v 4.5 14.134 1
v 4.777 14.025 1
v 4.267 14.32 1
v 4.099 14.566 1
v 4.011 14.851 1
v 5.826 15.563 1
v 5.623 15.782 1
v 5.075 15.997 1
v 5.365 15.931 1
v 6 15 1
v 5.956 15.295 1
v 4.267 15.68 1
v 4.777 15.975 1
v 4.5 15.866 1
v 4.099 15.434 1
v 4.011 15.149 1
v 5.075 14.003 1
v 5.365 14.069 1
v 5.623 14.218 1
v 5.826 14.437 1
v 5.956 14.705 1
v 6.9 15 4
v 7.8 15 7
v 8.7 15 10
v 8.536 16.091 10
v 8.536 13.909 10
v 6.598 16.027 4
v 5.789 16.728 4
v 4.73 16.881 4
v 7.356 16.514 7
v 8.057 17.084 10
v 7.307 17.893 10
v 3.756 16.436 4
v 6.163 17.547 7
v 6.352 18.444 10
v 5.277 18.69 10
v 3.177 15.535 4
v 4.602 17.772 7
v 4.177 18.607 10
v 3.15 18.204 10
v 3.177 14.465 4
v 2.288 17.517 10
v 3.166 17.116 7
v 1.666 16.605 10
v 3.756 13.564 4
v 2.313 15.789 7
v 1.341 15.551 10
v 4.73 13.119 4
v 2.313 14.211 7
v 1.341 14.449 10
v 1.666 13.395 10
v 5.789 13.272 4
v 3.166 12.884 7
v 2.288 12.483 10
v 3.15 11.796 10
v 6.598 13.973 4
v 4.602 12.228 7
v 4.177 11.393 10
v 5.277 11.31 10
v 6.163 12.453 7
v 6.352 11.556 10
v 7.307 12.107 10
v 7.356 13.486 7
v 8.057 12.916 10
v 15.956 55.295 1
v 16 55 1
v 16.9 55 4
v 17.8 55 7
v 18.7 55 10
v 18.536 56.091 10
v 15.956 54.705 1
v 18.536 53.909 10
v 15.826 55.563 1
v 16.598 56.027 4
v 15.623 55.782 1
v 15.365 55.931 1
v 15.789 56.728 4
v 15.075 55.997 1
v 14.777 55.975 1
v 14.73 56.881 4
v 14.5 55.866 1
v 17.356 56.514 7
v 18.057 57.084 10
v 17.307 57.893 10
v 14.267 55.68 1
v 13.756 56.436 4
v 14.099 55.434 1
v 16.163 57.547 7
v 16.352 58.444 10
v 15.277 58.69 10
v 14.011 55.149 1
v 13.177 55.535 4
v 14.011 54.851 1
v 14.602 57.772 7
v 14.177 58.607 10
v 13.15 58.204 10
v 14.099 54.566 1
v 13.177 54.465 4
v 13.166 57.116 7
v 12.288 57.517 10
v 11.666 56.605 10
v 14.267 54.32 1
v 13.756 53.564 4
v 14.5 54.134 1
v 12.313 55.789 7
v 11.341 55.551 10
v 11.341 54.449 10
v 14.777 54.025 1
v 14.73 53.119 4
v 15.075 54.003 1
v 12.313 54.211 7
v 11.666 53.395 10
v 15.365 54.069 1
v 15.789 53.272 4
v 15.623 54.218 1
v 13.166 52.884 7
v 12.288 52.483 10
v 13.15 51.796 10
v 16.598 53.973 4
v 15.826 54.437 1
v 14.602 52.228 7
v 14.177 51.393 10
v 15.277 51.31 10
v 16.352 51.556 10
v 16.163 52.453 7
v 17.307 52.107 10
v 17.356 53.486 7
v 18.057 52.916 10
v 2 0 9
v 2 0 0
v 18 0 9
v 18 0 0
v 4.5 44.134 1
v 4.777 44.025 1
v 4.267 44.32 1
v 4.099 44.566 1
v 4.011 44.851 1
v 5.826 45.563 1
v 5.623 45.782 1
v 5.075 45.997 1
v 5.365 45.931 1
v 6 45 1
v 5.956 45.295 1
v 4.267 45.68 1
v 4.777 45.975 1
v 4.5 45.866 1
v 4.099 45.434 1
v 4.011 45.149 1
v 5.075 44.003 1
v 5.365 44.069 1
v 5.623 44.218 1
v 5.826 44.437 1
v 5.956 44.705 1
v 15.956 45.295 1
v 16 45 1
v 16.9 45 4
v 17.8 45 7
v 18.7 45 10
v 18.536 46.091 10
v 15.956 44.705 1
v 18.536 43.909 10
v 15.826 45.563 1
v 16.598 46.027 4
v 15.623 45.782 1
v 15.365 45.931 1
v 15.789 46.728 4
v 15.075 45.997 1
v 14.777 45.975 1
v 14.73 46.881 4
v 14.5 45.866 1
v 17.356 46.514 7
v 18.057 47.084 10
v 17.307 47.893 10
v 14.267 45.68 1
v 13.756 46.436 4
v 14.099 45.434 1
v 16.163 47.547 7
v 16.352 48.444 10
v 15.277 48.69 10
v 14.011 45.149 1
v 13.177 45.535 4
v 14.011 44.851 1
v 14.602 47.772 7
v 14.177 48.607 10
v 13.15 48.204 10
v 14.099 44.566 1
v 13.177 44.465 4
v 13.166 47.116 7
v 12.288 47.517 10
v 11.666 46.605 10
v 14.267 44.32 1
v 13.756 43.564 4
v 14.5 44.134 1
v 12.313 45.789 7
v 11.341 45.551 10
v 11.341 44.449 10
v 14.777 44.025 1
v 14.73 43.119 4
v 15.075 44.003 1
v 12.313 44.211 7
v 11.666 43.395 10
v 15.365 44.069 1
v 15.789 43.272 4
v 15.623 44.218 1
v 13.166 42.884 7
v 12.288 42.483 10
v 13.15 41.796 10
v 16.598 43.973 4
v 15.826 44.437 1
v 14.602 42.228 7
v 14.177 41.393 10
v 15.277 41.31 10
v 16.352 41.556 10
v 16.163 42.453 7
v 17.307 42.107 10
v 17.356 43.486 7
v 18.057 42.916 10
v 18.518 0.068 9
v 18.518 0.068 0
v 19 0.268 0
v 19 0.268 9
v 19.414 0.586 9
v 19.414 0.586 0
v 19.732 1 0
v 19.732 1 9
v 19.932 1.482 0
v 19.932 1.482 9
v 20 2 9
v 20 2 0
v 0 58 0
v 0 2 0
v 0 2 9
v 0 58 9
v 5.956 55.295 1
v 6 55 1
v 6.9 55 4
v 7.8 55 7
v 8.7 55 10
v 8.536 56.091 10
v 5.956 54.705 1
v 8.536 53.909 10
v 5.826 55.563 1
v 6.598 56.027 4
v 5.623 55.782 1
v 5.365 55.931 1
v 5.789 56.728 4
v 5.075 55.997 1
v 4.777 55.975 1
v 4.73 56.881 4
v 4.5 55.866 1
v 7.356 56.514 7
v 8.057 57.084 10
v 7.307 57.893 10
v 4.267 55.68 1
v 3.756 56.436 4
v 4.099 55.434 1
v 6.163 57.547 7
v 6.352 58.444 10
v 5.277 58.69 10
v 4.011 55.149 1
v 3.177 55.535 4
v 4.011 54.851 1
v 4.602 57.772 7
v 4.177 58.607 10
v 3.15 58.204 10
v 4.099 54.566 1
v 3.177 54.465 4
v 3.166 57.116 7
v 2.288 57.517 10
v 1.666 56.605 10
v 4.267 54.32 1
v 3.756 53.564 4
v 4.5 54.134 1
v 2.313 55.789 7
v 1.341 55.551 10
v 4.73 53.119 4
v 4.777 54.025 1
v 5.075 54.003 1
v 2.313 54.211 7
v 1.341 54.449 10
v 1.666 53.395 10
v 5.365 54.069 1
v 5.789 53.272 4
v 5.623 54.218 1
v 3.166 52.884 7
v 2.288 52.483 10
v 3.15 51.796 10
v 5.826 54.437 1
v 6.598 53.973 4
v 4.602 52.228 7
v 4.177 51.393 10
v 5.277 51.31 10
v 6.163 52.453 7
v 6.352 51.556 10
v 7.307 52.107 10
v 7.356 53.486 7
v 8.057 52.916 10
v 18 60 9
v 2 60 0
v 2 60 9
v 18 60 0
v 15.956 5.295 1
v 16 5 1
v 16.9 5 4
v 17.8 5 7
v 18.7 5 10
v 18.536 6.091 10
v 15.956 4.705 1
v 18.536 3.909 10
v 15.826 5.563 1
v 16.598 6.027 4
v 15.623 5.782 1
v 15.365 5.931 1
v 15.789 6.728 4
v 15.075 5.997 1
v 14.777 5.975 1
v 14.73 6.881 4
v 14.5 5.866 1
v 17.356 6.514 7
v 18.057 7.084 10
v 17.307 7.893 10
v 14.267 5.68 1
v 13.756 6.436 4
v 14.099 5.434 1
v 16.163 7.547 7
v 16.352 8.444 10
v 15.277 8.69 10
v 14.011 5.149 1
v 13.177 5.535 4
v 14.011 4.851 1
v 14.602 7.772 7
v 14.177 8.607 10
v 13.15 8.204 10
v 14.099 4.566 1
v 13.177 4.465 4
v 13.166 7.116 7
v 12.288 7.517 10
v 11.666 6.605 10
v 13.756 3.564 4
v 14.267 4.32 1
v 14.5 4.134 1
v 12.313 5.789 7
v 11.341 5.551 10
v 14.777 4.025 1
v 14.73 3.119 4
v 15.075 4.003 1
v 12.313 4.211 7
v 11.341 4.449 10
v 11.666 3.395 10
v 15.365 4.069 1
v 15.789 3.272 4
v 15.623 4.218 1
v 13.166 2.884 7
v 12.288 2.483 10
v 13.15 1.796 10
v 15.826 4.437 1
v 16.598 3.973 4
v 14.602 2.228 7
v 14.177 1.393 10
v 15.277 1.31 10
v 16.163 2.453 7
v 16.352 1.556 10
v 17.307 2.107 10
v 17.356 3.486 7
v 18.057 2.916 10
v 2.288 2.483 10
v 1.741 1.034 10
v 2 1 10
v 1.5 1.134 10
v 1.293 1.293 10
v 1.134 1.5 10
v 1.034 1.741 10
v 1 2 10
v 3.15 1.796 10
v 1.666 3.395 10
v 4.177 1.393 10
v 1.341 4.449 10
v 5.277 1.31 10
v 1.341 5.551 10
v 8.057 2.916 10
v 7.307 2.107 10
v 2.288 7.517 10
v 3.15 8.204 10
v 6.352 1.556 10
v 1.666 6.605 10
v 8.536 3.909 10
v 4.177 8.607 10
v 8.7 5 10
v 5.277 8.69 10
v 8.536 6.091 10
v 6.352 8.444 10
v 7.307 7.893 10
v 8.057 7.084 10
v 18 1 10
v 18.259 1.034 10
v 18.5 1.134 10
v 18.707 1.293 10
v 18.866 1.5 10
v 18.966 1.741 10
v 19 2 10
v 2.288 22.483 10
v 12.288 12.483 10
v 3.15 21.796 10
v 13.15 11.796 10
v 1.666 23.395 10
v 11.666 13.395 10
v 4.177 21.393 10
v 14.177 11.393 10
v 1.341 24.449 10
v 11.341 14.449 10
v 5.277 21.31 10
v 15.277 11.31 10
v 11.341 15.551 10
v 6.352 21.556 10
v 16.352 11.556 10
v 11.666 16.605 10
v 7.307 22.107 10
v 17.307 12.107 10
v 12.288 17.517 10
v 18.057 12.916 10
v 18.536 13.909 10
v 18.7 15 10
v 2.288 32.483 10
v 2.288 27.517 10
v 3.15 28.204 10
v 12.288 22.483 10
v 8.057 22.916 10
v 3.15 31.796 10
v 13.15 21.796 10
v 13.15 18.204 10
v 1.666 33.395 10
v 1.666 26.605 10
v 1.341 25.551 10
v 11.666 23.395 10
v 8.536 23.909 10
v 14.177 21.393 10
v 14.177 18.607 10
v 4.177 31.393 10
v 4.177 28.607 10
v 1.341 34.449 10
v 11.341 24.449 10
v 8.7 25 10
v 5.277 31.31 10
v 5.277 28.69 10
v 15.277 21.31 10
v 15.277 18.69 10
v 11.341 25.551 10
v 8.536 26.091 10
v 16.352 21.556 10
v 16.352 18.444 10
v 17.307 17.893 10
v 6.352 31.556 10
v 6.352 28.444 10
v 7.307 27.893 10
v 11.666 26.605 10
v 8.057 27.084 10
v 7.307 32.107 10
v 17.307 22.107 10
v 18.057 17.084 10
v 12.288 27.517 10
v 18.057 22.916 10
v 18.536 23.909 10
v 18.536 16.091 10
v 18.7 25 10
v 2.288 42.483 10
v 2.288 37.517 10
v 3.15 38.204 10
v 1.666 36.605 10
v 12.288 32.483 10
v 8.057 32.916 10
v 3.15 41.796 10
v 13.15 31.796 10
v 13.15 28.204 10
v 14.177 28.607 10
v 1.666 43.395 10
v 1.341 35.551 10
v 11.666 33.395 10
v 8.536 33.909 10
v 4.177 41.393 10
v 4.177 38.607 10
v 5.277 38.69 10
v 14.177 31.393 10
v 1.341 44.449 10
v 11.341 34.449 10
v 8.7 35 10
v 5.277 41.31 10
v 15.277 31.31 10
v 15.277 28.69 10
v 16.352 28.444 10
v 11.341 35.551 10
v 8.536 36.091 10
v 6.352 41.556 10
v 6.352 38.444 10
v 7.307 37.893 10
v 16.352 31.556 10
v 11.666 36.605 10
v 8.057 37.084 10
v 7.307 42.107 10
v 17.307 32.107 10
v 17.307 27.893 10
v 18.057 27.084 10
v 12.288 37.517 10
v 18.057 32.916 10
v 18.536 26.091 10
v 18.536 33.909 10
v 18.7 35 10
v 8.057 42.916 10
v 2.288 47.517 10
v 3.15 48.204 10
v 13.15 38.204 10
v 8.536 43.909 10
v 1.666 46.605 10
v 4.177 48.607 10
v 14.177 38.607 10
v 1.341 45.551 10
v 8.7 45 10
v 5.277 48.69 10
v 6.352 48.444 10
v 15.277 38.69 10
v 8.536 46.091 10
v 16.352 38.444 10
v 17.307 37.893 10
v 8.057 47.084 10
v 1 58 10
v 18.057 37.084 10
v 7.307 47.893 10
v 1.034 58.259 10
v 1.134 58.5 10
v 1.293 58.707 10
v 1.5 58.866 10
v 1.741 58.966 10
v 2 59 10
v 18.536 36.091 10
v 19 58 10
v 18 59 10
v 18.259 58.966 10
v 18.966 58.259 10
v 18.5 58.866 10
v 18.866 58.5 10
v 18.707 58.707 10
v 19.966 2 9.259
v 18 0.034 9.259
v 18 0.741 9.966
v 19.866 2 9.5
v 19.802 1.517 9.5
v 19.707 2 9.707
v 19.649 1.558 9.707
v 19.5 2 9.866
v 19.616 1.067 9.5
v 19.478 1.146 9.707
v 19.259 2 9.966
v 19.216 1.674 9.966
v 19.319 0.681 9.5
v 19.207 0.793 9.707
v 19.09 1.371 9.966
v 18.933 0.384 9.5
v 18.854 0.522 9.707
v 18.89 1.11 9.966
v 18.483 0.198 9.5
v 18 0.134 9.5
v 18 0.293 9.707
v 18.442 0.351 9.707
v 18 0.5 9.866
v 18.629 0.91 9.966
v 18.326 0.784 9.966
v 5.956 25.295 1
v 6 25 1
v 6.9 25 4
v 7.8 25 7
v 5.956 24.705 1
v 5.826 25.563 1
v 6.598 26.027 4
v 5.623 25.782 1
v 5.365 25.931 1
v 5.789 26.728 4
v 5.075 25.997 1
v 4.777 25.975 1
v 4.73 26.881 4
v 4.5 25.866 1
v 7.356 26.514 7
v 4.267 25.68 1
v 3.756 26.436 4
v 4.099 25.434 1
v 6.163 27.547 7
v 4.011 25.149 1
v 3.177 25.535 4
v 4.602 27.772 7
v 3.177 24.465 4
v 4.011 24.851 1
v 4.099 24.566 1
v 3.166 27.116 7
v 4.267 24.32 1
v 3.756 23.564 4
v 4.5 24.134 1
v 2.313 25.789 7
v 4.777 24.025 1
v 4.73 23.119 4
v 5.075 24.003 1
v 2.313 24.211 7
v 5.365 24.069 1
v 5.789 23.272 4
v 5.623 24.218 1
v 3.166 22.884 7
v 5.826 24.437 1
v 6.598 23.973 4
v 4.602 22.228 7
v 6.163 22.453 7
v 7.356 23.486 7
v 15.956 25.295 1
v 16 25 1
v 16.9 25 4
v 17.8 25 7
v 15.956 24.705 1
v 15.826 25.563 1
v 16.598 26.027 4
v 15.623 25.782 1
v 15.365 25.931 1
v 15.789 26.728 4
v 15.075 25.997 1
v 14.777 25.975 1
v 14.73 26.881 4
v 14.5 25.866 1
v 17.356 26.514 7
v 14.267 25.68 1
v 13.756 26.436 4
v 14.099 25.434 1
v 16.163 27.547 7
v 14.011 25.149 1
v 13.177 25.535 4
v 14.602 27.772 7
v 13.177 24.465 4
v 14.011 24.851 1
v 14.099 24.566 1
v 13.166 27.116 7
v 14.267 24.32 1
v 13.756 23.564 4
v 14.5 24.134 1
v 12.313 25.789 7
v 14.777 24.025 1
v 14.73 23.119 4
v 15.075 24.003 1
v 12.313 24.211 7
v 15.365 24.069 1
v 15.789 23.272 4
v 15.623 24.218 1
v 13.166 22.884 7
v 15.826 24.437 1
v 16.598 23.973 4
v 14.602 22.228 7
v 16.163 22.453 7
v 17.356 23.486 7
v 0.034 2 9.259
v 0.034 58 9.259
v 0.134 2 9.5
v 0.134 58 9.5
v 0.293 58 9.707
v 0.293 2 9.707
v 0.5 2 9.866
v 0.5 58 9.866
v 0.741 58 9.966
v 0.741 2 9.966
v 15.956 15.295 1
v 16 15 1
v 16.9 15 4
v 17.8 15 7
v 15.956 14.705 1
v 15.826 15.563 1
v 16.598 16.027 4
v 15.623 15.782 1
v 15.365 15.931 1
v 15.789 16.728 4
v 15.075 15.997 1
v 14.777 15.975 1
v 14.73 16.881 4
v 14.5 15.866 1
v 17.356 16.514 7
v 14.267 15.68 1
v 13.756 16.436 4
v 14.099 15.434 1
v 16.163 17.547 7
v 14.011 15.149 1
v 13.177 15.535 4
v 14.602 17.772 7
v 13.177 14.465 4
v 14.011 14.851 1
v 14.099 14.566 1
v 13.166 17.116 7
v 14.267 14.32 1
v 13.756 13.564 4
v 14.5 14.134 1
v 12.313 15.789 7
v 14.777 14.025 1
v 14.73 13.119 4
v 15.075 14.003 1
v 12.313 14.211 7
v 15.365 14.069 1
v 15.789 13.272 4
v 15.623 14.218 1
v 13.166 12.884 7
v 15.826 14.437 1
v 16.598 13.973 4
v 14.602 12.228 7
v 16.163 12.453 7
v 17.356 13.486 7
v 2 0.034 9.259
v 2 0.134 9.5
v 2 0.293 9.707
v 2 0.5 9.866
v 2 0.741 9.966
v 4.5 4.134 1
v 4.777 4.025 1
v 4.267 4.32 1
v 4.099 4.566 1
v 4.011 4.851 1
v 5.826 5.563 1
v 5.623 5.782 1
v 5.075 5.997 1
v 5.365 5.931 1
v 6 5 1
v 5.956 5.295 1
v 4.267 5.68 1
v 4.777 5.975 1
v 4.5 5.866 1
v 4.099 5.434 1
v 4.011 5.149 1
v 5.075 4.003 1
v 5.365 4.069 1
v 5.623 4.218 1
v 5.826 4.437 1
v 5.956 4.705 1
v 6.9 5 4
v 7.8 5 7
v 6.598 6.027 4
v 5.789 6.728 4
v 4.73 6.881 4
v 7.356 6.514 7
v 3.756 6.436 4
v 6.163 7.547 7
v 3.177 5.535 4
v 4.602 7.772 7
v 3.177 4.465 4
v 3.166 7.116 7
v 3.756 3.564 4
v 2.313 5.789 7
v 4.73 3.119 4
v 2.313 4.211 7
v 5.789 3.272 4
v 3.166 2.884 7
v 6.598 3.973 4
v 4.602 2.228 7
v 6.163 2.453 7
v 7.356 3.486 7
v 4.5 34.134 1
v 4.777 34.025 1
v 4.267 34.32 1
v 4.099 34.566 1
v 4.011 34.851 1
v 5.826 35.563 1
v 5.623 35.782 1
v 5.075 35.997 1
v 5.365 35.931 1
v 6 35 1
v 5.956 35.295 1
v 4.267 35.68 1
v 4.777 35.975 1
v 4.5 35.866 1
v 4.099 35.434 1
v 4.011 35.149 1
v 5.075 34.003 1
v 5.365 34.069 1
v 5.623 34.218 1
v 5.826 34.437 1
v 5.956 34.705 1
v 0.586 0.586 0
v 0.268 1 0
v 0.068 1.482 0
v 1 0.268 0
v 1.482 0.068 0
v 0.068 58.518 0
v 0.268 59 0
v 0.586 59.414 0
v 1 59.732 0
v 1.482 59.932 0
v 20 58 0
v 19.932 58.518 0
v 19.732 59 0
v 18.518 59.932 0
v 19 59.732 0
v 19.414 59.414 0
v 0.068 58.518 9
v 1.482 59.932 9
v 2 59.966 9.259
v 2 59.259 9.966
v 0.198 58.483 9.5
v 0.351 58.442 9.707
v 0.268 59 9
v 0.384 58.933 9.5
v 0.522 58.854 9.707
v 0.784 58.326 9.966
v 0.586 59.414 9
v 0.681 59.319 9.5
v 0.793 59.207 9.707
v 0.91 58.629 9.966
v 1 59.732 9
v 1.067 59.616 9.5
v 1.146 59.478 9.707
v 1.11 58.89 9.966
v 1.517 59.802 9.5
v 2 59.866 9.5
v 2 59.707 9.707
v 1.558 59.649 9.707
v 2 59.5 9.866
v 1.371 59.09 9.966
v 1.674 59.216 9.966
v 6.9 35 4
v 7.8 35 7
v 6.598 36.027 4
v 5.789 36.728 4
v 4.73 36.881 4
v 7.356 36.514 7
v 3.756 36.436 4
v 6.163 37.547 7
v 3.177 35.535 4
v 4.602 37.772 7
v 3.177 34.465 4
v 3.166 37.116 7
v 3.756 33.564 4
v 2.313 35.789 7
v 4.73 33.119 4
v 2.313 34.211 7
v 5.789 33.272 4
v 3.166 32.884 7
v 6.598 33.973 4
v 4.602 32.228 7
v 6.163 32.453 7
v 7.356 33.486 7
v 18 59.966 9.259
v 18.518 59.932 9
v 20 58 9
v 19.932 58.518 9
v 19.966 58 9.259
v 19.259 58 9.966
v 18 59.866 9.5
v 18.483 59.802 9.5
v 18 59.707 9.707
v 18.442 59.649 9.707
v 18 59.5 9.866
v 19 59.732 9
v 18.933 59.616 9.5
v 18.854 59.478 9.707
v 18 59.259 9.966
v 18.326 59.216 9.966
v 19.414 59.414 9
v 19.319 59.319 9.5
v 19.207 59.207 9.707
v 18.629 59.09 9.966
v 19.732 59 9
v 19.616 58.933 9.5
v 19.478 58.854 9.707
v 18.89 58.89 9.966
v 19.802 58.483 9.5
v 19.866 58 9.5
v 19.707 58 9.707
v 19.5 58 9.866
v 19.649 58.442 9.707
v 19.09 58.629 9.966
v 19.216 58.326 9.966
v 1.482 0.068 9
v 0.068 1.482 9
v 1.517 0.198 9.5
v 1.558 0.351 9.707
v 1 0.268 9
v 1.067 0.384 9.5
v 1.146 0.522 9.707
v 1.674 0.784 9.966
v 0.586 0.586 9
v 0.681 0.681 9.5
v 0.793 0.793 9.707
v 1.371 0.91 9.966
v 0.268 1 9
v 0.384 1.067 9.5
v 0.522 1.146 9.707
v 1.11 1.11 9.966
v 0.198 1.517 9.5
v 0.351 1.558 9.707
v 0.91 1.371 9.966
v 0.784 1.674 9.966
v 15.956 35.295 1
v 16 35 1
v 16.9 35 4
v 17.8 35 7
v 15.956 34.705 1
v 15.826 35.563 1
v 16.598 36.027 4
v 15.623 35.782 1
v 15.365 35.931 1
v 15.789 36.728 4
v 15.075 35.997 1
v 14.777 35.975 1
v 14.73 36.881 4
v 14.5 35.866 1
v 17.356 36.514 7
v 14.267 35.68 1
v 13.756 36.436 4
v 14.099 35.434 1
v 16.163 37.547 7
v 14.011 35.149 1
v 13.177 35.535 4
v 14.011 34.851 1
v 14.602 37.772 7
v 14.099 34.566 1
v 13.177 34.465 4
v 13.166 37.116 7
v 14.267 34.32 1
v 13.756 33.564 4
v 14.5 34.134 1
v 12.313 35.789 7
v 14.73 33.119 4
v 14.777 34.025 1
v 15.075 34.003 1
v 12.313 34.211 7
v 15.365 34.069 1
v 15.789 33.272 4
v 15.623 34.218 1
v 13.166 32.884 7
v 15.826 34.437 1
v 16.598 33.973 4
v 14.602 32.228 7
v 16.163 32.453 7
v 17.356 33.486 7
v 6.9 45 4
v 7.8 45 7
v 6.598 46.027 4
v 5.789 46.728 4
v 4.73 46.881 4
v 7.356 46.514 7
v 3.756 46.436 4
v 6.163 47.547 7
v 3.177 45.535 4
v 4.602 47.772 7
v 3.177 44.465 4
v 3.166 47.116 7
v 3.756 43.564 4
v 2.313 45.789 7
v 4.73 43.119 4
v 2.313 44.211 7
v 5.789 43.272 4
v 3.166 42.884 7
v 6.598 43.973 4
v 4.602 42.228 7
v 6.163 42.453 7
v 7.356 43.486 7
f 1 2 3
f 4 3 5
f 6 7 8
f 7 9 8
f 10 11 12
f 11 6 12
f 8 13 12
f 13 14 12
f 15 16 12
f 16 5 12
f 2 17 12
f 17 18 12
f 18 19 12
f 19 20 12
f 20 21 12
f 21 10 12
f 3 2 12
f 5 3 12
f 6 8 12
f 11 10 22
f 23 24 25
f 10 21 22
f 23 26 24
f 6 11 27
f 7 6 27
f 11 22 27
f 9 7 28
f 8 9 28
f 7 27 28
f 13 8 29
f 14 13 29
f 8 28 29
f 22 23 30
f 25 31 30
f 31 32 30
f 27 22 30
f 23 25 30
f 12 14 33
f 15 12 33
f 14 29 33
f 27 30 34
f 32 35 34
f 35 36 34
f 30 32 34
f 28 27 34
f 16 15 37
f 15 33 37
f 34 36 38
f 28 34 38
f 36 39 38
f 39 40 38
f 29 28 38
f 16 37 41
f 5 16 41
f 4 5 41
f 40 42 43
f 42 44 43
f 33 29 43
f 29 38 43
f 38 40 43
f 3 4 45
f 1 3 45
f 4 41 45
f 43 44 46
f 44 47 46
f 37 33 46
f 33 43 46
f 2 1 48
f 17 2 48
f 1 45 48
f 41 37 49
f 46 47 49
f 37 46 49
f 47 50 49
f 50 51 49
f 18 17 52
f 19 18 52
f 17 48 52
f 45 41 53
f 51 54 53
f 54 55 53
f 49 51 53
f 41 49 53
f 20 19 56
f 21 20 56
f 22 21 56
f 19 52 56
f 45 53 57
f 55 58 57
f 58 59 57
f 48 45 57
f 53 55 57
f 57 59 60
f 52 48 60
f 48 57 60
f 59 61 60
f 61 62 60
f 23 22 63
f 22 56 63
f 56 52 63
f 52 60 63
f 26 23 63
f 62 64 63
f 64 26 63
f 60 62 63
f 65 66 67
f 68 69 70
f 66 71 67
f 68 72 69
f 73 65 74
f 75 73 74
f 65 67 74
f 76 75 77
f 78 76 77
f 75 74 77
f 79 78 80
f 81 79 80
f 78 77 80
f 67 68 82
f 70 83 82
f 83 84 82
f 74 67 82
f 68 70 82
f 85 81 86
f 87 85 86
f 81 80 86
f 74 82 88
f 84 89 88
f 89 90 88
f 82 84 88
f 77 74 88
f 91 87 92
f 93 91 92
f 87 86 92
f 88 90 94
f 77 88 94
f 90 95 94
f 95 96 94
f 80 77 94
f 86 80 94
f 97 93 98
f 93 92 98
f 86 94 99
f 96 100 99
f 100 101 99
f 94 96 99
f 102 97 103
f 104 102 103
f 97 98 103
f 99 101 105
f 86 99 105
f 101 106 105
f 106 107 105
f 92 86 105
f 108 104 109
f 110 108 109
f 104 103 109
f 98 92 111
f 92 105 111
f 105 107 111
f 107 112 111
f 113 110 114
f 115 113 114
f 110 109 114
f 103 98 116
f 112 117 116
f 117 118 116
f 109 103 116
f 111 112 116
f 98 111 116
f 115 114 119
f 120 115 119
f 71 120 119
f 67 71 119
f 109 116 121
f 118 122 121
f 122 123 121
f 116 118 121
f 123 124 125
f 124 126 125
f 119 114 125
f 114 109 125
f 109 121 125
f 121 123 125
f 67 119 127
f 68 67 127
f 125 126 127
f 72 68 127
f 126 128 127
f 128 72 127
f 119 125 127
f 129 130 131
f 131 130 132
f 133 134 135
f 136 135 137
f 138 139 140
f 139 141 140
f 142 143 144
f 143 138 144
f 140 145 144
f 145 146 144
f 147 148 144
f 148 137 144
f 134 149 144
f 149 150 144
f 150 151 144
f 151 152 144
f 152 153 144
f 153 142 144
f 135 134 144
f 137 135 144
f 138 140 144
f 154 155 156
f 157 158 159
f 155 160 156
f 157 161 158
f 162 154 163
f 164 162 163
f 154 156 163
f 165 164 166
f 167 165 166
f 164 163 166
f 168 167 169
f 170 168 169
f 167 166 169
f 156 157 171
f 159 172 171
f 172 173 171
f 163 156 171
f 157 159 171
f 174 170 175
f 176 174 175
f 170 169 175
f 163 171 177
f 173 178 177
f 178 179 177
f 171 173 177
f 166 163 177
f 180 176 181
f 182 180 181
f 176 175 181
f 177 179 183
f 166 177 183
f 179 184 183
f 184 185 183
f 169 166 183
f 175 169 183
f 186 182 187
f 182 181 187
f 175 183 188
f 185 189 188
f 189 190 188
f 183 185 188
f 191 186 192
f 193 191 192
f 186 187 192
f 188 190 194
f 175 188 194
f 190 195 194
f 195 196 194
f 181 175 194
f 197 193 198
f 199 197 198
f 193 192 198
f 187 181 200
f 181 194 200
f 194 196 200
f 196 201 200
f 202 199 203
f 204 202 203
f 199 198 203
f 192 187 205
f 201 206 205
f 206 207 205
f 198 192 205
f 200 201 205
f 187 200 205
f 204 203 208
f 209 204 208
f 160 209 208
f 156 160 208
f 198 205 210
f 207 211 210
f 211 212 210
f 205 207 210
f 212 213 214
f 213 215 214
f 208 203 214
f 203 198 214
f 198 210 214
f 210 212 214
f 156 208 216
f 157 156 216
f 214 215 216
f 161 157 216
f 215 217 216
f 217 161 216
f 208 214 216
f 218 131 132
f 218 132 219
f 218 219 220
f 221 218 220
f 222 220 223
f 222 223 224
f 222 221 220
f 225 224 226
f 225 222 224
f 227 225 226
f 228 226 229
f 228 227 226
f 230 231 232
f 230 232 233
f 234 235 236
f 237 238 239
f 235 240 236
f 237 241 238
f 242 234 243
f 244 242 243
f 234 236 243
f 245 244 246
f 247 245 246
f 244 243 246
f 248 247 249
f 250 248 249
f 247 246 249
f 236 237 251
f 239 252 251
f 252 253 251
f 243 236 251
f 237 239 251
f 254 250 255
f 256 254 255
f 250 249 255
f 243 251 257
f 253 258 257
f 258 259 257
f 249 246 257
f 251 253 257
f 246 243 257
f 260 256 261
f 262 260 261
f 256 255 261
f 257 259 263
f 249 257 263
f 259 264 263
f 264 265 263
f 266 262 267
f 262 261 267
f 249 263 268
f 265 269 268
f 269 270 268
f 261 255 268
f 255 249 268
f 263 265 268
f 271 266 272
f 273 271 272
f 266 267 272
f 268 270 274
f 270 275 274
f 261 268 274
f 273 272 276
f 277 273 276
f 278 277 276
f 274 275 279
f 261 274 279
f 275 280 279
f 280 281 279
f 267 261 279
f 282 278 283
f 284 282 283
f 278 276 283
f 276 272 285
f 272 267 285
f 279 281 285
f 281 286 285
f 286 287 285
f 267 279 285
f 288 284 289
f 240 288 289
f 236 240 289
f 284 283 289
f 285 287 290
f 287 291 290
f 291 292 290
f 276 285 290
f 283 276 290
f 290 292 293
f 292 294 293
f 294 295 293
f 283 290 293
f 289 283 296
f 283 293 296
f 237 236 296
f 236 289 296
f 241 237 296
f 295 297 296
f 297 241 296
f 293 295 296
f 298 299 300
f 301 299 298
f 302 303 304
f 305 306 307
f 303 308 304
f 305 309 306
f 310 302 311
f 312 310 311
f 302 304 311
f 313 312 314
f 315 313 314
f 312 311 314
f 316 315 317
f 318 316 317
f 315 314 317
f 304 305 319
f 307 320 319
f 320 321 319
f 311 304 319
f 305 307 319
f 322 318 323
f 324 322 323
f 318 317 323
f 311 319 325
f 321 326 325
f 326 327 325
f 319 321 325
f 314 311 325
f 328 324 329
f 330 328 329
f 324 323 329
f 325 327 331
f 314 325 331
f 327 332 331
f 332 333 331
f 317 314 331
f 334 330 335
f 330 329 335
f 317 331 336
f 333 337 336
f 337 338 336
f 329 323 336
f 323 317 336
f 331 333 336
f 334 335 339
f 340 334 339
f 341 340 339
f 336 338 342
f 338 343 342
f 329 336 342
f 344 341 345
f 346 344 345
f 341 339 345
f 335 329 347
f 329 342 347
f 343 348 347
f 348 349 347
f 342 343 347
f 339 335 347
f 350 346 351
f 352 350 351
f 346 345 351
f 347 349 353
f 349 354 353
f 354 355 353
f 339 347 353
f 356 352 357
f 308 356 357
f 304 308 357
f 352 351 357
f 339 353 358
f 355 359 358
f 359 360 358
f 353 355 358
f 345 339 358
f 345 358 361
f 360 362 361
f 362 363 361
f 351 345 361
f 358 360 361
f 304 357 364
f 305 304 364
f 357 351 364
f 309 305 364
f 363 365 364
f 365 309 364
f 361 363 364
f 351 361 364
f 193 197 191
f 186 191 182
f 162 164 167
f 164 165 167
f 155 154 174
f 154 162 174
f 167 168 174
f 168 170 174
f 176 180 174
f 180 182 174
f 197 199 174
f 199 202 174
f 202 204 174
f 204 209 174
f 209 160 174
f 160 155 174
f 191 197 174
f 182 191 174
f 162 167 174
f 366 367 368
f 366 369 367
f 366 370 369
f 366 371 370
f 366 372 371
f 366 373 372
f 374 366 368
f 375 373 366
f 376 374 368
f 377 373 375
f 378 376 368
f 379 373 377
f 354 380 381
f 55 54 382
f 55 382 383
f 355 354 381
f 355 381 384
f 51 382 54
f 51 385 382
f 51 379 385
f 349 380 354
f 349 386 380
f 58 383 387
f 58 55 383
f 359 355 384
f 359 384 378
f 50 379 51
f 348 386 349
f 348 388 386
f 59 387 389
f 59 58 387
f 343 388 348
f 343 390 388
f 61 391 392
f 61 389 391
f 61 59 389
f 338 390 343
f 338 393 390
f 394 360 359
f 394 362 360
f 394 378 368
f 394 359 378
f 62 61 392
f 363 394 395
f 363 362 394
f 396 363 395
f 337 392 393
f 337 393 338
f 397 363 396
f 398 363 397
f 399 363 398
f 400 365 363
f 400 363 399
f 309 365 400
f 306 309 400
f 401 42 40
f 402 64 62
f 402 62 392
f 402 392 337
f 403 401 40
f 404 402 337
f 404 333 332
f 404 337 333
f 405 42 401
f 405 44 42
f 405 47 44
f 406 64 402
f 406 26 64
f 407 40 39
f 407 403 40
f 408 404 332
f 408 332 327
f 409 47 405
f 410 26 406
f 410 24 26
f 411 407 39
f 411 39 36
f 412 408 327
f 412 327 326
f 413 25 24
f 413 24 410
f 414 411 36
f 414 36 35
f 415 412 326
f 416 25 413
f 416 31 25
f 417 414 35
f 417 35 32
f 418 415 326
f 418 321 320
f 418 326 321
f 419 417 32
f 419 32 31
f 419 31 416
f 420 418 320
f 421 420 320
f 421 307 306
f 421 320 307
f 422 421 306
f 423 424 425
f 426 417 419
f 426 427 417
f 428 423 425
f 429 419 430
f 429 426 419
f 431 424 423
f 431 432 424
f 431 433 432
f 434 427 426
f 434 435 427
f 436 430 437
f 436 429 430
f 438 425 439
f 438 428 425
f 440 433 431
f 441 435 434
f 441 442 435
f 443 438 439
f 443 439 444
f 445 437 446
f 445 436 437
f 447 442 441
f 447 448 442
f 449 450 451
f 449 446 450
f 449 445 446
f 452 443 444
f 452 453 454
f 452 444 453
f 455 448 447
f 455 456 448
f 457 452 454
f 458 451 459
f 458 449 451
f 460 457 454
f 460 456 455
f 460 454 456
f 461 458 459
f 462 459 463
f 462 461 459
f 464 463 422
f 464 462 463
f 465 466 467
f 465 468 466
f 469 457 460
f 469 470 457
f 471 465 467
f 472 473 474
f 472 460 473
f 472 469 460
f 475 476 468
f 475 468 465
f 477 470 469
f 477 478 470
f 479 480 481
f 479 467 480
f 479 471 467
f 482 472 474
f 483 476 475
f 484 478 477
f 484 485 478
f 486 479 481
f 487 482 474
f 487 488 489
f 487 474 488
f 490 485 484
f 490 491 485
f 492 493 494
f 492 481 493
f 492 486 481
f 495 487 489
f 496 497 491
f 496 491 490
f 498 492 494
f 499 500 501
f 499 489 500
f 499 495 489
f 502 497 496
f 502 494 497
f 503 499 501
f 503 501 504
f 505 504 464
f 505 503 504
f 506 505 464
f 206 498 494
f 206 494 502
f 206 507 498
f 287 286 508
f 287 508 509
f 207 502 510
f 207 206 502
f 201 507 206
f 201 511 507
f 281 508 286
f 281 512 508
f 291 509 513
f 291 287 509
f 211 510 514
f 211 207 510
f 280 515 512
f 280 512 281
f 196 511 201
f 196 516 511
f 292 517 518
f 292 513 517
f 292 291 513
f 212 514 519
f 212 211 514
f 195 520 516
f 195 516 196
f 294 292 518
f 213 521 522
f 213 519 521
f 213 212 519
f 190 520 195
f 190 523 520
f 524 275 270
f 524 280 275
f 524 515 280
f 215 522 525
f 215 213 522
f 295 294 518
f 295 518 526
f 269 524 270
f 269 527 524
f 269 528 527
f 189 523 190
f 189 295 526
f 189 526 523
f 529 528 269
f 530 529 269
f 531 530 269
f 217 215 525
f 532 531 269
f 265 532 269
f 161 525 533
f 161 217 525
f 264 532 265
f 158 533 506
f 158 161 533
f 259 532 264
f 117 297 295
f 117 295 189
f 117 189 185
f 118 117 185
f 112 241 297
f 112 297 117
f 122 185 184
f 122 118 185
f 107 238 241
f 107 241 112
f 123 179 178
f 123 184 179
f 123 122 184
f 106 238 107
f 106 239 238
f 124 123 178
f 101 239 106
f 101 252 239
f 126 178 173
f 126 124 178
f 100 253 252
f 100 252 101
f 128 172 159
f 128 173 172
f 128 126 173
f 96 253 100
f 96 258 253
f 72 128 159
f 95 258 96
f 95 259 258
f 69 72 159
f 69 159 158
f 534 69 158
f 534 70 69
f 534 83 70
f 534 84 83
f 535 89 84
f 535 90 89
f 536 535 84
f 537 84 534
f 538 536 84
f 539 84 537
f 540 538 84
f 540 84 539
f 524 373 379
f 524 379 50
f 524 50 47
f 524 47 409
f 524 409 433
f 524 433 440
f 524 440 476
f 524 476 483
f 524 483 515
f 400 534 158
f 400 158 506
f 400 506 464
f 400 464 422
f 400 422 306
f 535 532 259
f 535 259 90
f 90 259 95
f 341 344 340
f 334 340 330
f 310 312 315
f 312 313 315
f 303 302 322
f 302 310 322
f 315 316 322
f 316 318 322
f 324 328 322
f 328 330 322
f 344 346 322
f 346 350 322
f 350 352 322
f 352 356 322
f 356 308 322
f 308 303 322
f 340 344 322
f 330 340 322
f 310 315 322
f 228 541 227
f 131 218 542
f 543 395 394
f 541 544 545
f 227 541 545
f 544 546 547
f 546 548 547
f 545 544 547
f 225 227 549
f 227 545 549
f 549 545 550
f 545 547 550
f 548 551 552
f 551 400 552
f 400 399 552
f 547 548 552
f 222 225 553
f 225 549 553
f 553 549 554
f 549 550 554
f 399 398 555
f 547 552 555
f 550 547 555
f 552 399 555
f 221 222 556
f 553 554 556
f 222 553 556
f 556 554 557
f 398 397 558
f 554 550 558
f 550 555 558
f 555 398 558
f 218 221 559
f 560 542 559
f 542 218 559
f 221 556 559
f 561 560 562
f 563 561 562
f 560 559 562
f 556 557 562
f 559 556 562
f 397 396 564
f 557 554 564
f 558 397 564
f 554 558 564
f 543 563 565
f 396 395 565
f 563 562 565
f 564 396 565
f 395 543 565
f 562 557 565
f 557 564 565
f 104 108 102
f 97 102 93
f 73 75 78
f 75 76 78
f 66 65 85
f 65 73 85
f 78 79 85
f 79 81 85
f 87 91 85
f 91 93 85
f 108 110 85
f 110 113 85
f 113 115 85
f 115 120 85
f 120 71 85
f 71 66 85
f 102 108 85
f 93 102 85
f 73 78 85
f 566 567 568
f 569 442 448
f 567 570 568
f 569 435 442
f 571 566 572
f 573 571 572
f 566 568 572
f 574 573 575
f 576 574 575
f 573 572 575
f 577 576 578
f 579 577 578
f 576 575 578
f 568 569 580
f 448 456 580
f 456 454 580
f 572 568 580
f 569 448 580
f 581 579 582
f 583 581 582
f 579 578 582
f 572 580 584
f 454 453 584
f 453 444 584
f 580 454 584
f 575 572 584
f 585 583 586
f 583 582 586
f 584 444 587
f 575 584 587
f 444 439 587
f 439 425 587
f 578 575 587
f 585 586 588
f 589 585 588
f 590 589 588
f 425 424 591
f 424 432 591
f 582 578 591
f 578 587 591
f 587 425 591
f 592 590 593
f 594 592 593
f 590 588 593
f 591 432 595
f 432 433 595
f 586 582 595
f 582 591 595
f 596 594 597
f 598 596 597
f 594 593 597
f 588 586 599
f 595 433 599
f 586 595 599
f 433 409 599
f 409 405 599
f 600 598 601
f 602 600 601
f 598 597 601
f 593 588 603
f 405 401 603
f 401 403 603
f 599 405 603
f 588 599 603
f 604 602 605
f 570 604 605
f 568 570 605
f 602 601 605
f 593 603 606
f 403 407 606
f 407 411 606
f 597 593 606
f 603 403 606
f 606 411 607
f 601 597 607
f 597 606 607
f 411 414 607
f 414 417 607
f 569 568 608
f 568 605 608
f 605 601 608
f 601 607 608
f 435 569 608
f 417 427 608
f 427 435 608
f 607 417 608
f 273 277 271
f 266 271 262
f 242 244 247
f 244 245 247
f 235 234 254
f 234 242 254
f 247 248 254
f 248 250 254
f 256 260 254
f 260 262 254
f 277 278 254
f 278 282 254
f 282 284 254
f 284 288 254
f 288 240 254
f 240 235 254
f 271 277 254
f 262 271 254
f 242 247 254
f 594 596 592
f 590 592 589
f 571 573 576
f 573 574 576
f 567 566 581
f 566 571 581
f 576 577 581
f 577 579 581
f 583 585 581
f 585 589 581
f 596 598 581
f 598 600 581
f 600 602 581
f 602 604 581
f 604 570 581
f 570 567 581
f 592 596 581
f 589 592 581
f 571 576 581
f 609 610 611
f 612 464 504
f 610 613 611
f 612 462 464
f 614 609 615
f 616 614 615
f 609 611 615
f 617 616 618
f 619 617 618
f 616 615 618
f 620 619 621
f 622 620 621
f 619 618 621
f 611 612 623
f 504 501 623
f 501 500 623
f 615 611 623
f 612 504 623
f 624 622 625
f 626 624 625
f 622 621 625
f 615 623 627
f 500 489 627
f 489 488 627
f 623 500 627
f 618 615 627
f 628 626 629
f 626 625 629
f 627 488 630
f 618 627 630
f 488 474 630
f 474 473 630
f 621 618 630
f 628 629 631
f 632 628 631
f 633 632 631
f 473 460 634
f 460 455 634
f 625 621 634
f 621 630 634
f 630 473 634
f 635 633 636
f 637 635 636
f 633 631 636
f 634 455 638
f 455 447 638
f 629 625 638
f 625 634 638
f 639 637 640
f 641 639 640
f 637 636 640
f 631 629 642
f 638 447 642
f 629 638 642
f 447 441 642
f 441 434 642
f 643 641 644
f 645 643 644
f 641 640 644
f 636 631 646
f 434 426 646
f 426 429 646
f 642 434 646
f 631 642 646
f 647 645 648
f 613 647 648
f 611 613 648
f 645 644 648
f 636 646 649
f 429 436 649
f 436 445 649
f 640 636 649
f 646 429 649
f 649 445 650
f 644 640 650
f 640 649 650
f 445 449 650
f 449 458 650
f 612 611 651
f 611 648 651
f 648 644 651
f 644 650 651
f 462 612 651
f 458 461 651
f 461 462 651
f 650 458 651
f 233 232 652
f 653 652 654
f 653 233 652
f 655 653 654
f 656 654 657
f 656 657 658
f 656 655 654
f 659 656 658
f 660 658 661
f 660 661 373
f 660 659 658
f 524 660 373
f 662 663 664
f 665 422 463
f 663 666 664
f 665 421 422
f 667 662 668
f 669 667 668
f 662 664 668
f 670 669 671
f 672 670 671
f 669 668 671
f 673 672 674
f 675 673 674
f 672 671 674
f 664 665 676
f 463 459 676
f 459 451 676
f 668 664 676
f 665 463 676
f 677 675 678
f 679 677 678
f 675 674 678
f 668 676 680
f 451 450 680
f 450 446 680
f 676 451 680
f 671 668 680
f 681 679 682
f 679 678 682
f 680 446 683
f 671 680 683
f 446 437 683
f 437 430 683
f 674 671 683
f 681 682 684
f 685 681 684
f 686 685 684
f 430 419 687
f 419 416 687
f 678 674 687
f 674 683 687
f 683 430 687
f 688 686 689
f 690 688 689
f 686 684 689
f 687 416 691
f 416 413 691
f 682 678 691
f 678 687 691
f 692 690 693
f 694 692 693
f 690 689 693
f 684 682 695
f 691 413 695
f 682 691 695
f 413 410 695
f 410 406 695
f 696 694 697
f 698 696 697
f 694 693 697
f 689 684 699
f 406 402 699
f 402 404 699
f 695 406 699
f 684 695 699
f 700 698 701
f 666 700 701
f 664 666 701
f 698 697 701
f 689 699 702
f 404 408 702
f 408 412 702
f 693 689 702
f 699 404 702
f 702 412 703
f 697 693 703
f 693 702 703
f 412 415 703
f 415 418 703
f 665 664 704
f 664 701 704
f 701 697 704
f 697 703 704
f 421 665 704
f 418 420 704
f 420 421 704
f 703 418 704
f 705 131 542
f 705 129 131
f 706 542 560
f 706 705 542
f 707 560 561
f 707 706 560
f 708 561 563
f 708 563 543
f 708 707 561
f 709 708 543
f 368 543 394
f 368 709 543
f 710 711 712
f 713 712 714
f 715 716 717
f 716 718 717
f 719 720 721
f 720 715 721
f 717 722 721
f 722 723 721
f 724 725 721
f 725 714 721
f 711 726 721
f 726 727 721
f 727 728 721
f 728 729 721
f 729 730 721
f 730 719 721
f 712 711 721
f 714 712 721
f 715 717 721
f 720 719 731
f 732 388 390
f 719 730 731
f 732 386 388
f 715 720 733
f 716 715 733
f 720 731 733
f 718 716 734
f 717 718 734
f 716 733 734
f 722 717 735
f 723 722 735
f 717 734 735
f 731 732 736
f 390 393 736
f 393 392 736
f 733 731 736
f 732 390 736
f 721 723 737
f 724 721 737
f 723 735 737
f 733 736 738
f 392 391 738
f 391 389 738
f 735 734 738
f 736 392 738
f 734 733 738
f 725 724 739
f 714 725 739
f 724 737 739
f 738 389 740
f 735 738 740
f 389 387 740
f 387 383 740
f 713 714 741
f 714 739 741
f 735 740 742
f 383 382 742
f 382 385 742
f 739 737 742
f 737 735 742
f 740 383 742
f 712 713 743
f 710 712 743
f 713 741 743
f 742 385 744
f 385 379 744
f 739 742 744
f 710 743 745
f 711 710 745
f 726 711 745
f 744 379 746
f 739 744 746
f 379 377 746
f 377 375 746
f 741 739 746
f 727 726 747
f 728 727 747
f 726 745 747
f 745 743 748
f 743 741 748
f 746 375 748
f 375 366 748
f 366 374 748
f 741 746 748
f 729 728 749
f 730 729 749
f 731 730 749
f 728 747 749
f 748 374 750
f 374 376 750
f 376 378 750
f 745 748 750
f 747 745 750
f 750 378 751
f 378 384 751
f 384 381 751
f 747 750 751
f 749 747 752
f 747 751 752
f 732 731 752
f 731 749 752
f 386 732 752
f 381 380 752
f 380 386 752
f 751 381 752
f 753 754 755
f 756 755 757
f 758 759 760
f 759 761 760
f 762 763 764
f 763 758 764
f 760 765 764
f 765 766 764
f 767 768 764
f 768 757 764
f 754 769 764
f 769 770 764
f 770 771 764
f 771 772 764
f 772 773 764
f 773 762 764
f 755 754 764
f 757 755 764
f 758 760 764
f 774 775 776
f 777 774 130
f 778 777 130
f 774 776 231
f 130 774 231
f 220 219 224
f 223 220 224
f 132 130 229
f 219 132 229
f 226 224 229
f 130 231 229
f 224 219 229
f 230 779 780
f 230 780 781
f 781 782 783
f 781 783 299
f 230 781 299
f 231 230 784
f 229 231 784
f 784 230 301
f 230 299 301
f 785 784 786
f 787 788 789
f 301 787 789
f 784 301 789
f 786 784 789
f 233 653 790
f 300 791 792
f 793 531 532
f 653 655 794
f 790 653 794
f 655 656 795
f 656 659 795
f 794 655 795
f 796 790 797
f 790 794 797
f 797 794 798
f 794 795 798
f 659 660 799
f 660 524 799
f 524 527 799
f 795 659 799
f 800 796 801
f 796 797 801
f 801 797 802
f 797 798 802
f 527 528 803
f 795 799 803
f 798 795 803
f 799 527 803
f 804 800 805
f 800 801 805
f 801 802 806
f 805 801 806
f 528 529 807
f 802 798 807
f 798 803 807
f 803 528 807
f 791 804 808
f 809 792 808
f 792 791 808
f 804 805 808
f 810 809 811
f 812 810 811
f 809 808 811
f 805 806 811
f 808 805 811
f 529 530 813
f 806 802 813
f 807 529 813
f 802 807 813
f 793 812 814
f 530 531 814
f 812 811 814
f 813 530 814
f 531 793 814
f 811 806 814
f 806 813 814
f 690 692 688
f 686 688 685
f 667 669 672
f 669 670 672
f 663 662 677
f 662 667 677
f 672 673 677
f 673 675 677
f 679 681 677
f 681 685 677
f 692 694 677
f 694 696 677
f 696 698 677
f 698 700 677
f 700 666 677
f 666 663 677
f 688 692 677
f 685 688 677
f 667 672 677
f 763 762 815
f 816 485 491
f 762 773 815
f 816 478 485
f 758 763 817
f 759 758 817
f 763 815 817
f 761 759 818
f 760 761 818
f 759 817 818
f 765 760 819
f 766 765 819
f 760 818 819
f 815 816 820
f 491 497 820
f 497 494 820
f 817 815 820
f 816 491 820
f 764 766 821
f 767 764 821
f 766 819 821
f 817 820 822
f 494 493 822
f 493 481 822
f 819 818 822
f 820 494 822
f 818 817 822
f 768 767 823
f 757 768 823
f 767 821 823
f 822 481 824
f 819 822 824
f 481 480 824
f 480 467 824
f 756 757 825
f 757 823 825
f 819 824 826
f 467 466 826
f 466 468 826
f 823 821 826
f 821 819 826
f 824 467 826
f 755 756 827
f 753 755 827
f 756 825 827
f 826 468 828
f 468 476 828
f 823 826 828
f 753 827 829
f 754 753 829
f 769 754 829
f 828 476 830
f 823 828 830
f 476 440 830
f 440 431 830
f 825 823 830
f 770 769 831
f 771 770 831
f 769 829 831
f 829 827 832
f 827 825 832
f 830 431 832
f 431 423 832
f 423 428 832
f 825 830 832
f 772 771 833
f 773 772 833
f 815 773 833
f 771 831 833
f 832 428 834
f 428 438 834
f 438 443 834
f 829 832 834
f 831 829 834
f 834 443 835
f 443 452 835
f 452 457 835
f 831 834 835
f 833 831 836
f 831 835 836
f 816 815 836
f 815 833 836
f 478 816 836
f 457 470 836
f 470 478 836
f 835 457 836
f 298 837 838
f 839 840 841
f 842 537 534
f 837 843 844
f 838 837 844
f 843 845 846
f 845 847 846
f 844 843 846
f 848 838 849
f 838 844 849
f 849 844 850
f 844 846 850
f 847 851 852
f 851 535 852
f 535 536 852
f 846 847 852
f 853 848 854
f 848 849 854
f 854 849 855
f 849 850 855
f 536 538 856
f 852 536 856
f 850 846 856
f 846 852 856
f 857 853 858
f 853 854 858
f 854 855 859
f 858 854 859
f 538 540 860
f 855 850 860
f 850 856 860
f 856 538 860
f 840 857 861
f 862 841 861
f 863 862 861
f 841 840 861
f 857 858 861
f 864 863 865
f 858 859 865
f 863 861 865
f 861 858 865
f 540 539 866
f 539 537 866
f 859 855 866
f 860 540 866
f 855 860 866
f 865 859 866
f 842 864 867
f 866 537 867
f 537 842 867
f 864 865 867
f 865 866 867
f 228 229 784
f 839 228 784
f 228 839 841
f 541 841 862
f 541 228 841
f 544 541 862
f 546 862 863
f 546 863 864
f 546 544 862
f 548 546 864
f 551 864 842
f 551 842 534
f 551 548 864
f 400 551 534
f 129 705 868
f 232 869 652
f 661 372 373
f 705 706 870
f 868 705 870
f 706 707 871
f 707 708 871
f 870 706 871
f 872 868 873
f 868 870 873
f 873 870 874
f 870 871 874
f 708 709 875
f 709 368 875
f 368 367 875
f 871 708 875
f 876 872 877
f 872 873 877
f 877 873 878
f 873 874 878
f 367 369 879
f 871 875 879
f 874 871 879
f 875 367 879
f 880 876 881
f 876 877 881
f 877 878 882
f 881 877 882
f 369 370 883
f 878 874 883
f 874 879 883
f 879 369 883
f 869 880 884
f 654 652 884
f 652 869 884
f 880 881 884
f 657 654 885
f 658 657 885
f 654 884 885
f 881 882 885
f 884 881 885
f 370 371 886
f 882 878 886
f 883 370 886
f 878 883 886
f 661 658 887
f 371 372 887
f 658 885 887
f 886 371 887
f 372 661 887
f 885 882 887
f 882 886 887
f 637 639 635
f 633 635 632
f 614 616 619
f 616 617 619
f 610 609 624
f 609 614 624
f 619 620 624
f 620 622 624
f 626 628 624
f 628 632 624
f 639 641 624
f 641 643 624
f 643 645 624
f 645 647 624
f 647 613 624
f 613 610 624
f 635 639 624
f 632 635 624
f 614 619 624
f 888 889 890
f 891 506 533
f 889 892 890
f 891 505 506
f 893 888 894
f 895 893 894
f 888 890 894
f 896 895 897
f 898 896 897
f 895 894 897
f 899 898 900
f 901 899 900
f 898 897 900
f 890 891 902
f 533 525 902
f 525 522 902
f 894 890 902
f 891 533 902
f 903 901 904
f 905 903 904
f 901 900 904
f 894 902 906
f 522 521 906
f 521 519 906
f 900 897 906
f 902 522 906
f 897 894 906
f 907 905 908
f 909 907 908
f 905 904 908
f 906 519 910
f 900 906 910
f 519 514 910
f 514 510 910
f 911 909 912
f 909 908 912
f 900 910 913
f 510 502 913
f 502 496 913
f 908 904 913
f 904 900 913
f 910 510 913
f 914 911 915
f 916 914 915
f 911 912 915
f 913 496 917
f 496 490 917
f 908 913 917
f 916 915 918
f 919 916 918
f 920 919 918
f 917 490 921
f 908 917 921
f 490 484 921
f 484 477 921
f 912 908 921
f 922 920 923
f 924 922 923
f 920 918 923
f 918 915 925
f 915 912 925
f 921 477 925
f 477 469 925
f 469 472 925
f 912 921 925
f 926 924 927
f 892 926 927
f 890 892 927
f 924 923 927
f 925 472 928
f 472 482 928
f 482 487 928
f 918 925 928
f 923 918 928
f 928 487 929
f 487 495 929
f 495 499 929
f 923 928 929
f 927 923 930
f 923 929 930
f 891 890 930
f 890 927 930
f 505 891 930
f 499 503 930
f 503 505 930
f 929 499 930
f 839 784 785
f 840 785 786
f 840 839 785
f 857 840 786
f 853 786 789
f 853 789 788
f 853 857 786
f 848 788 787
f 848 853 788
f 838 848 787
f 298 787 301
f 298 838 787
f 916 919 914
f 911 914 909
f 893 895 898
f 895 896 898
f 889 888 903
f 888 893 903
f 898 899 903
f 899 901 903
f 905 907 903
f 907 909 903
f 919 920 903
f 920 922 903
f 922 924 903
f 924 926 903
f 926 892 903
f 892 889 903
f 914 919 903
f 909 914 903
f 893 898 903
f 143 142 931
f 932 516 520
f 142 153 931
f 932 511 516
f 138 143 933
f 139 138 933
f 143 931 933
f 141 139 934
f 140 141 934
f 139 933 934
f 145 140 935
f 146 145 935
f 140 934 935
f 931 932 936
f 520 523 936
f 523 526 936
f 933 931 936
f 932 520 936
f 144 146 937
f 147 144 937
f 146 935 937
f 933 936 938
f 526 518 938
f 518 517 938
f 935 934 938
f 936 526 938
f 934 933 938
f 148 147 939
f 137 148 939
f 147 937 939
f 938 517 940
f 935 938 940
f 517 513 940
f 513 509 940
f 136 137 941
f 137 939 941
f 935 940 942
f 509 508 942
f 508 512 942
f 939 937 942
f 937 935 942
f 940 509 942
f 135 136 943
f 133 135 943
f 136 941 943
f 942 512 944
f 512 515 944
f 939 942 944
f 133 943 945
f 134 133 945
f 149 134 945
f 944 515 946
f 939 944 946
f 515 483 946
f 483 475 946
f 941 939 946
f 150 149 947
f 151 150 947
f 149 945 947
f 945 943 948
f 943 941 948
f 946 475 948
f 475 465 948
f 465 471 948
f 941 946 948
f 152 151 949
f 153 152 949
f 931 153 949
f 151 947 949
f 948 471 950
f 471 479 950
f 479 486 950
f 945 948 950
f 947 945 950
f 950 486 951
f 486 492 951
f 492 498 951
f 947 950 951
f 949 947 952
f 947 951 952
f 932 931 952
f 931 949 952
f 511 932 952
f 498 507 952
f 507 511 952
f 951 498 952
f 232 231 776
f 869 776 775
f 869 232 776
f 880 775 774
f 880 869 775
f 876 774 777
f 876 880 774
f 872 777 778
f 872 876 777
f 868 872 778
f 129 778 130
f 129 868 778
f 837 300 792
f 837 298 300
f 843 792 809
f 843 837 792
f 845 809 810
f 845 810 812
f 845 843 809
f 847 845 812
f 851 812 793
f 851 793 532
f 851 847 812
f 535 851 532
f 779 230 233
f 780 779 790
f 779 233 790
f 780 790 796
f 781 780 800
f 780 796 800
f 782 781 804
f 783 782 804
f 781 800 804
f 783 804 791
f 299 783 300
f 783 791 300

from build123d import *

# Parameters (mm, degrees)
ARRAY_X_COUNT = 2
ARRAY_X_PITCH = 10
ARRAY_Y_COUNT = 6
ARRAY_Y_PITCH = 10
BOX_W         = 20
BOX_H         = 60
BOX_DEPTH     = 10
FILLET_R      = 2
FILLET001_R   = 1


with BuildPart() as array_de_cubs:
    # Cone → Cone (revolve)
    with BuildSketch(Plane(origin=(5, 5, 1), x_dir=(1, 0, 0), z_dir=(0, -1, 0))):
        Polygon((0, 0), (1, 0), (4, 10), (0, 10), align=None)
    revolve(axis=Axis((5, 5, 1), (0, 0, 1)))

    # Array X: Array de cubs ×2


with BuildPart() as array_de_cubs_1:
    add(array_de_cubs.part)
    with Locations(*[(i * ARRAY_X_PITCH, 0, 0) for i in range(1, ARRAY_X_COUNT)]):
        add(array_de_cubs.part)

    # Array Y: Array de cubs ×6


with BuildPart() as array_de_cubs_2:
    add(array_de_cubs_1.part)
    with Locations(*[(0, i * ARRAY_Y_PITCH, 0) for i in range(1, ARRAY_Y_COUNT)]):
        add(array_de_cubs_1.part)


with BuildPart() as fillet001:
    # Box → Box (new body)
    with BuildSketch(Plane.XY):
        with Locations((10, 30)):
            Rectangle(BOX_W, BOX_H)
    extrude(amount=BOX_DEPTH)

    # Fillet
    fillet_edges = [fillet001.edges().sort_by_distance(p)[0] for p in [
        (0, 0, 5),
        (0, 60, 5),
        (20, 0, 5),
        (20, 60, 5),
    ]]
    fillet(fillet_edges, radius=FILLET_R)

    # Cut: cut Array de cubs
    add(array_de_cubs_2.part, mode=Mode.SUBTRACT)

    # Fillet001
    fillet001_edges = [fillet001.edges().sort_by_distance(p)[0] for p in [
        (0, 30, 10),
        (0.585786, 0.585786, 10),
        (0.585786, 59.414214, 10),
        (10, 0, 10),
        (10, 60, 10),
        (19.414214, 0.585786, 10),
        (19.414214, 59.414214, 10),
        (20, 30, 10),
    ]]
    fillet(fillet001_edges, radius=FILLET001_R)


solid = fillet001.part
